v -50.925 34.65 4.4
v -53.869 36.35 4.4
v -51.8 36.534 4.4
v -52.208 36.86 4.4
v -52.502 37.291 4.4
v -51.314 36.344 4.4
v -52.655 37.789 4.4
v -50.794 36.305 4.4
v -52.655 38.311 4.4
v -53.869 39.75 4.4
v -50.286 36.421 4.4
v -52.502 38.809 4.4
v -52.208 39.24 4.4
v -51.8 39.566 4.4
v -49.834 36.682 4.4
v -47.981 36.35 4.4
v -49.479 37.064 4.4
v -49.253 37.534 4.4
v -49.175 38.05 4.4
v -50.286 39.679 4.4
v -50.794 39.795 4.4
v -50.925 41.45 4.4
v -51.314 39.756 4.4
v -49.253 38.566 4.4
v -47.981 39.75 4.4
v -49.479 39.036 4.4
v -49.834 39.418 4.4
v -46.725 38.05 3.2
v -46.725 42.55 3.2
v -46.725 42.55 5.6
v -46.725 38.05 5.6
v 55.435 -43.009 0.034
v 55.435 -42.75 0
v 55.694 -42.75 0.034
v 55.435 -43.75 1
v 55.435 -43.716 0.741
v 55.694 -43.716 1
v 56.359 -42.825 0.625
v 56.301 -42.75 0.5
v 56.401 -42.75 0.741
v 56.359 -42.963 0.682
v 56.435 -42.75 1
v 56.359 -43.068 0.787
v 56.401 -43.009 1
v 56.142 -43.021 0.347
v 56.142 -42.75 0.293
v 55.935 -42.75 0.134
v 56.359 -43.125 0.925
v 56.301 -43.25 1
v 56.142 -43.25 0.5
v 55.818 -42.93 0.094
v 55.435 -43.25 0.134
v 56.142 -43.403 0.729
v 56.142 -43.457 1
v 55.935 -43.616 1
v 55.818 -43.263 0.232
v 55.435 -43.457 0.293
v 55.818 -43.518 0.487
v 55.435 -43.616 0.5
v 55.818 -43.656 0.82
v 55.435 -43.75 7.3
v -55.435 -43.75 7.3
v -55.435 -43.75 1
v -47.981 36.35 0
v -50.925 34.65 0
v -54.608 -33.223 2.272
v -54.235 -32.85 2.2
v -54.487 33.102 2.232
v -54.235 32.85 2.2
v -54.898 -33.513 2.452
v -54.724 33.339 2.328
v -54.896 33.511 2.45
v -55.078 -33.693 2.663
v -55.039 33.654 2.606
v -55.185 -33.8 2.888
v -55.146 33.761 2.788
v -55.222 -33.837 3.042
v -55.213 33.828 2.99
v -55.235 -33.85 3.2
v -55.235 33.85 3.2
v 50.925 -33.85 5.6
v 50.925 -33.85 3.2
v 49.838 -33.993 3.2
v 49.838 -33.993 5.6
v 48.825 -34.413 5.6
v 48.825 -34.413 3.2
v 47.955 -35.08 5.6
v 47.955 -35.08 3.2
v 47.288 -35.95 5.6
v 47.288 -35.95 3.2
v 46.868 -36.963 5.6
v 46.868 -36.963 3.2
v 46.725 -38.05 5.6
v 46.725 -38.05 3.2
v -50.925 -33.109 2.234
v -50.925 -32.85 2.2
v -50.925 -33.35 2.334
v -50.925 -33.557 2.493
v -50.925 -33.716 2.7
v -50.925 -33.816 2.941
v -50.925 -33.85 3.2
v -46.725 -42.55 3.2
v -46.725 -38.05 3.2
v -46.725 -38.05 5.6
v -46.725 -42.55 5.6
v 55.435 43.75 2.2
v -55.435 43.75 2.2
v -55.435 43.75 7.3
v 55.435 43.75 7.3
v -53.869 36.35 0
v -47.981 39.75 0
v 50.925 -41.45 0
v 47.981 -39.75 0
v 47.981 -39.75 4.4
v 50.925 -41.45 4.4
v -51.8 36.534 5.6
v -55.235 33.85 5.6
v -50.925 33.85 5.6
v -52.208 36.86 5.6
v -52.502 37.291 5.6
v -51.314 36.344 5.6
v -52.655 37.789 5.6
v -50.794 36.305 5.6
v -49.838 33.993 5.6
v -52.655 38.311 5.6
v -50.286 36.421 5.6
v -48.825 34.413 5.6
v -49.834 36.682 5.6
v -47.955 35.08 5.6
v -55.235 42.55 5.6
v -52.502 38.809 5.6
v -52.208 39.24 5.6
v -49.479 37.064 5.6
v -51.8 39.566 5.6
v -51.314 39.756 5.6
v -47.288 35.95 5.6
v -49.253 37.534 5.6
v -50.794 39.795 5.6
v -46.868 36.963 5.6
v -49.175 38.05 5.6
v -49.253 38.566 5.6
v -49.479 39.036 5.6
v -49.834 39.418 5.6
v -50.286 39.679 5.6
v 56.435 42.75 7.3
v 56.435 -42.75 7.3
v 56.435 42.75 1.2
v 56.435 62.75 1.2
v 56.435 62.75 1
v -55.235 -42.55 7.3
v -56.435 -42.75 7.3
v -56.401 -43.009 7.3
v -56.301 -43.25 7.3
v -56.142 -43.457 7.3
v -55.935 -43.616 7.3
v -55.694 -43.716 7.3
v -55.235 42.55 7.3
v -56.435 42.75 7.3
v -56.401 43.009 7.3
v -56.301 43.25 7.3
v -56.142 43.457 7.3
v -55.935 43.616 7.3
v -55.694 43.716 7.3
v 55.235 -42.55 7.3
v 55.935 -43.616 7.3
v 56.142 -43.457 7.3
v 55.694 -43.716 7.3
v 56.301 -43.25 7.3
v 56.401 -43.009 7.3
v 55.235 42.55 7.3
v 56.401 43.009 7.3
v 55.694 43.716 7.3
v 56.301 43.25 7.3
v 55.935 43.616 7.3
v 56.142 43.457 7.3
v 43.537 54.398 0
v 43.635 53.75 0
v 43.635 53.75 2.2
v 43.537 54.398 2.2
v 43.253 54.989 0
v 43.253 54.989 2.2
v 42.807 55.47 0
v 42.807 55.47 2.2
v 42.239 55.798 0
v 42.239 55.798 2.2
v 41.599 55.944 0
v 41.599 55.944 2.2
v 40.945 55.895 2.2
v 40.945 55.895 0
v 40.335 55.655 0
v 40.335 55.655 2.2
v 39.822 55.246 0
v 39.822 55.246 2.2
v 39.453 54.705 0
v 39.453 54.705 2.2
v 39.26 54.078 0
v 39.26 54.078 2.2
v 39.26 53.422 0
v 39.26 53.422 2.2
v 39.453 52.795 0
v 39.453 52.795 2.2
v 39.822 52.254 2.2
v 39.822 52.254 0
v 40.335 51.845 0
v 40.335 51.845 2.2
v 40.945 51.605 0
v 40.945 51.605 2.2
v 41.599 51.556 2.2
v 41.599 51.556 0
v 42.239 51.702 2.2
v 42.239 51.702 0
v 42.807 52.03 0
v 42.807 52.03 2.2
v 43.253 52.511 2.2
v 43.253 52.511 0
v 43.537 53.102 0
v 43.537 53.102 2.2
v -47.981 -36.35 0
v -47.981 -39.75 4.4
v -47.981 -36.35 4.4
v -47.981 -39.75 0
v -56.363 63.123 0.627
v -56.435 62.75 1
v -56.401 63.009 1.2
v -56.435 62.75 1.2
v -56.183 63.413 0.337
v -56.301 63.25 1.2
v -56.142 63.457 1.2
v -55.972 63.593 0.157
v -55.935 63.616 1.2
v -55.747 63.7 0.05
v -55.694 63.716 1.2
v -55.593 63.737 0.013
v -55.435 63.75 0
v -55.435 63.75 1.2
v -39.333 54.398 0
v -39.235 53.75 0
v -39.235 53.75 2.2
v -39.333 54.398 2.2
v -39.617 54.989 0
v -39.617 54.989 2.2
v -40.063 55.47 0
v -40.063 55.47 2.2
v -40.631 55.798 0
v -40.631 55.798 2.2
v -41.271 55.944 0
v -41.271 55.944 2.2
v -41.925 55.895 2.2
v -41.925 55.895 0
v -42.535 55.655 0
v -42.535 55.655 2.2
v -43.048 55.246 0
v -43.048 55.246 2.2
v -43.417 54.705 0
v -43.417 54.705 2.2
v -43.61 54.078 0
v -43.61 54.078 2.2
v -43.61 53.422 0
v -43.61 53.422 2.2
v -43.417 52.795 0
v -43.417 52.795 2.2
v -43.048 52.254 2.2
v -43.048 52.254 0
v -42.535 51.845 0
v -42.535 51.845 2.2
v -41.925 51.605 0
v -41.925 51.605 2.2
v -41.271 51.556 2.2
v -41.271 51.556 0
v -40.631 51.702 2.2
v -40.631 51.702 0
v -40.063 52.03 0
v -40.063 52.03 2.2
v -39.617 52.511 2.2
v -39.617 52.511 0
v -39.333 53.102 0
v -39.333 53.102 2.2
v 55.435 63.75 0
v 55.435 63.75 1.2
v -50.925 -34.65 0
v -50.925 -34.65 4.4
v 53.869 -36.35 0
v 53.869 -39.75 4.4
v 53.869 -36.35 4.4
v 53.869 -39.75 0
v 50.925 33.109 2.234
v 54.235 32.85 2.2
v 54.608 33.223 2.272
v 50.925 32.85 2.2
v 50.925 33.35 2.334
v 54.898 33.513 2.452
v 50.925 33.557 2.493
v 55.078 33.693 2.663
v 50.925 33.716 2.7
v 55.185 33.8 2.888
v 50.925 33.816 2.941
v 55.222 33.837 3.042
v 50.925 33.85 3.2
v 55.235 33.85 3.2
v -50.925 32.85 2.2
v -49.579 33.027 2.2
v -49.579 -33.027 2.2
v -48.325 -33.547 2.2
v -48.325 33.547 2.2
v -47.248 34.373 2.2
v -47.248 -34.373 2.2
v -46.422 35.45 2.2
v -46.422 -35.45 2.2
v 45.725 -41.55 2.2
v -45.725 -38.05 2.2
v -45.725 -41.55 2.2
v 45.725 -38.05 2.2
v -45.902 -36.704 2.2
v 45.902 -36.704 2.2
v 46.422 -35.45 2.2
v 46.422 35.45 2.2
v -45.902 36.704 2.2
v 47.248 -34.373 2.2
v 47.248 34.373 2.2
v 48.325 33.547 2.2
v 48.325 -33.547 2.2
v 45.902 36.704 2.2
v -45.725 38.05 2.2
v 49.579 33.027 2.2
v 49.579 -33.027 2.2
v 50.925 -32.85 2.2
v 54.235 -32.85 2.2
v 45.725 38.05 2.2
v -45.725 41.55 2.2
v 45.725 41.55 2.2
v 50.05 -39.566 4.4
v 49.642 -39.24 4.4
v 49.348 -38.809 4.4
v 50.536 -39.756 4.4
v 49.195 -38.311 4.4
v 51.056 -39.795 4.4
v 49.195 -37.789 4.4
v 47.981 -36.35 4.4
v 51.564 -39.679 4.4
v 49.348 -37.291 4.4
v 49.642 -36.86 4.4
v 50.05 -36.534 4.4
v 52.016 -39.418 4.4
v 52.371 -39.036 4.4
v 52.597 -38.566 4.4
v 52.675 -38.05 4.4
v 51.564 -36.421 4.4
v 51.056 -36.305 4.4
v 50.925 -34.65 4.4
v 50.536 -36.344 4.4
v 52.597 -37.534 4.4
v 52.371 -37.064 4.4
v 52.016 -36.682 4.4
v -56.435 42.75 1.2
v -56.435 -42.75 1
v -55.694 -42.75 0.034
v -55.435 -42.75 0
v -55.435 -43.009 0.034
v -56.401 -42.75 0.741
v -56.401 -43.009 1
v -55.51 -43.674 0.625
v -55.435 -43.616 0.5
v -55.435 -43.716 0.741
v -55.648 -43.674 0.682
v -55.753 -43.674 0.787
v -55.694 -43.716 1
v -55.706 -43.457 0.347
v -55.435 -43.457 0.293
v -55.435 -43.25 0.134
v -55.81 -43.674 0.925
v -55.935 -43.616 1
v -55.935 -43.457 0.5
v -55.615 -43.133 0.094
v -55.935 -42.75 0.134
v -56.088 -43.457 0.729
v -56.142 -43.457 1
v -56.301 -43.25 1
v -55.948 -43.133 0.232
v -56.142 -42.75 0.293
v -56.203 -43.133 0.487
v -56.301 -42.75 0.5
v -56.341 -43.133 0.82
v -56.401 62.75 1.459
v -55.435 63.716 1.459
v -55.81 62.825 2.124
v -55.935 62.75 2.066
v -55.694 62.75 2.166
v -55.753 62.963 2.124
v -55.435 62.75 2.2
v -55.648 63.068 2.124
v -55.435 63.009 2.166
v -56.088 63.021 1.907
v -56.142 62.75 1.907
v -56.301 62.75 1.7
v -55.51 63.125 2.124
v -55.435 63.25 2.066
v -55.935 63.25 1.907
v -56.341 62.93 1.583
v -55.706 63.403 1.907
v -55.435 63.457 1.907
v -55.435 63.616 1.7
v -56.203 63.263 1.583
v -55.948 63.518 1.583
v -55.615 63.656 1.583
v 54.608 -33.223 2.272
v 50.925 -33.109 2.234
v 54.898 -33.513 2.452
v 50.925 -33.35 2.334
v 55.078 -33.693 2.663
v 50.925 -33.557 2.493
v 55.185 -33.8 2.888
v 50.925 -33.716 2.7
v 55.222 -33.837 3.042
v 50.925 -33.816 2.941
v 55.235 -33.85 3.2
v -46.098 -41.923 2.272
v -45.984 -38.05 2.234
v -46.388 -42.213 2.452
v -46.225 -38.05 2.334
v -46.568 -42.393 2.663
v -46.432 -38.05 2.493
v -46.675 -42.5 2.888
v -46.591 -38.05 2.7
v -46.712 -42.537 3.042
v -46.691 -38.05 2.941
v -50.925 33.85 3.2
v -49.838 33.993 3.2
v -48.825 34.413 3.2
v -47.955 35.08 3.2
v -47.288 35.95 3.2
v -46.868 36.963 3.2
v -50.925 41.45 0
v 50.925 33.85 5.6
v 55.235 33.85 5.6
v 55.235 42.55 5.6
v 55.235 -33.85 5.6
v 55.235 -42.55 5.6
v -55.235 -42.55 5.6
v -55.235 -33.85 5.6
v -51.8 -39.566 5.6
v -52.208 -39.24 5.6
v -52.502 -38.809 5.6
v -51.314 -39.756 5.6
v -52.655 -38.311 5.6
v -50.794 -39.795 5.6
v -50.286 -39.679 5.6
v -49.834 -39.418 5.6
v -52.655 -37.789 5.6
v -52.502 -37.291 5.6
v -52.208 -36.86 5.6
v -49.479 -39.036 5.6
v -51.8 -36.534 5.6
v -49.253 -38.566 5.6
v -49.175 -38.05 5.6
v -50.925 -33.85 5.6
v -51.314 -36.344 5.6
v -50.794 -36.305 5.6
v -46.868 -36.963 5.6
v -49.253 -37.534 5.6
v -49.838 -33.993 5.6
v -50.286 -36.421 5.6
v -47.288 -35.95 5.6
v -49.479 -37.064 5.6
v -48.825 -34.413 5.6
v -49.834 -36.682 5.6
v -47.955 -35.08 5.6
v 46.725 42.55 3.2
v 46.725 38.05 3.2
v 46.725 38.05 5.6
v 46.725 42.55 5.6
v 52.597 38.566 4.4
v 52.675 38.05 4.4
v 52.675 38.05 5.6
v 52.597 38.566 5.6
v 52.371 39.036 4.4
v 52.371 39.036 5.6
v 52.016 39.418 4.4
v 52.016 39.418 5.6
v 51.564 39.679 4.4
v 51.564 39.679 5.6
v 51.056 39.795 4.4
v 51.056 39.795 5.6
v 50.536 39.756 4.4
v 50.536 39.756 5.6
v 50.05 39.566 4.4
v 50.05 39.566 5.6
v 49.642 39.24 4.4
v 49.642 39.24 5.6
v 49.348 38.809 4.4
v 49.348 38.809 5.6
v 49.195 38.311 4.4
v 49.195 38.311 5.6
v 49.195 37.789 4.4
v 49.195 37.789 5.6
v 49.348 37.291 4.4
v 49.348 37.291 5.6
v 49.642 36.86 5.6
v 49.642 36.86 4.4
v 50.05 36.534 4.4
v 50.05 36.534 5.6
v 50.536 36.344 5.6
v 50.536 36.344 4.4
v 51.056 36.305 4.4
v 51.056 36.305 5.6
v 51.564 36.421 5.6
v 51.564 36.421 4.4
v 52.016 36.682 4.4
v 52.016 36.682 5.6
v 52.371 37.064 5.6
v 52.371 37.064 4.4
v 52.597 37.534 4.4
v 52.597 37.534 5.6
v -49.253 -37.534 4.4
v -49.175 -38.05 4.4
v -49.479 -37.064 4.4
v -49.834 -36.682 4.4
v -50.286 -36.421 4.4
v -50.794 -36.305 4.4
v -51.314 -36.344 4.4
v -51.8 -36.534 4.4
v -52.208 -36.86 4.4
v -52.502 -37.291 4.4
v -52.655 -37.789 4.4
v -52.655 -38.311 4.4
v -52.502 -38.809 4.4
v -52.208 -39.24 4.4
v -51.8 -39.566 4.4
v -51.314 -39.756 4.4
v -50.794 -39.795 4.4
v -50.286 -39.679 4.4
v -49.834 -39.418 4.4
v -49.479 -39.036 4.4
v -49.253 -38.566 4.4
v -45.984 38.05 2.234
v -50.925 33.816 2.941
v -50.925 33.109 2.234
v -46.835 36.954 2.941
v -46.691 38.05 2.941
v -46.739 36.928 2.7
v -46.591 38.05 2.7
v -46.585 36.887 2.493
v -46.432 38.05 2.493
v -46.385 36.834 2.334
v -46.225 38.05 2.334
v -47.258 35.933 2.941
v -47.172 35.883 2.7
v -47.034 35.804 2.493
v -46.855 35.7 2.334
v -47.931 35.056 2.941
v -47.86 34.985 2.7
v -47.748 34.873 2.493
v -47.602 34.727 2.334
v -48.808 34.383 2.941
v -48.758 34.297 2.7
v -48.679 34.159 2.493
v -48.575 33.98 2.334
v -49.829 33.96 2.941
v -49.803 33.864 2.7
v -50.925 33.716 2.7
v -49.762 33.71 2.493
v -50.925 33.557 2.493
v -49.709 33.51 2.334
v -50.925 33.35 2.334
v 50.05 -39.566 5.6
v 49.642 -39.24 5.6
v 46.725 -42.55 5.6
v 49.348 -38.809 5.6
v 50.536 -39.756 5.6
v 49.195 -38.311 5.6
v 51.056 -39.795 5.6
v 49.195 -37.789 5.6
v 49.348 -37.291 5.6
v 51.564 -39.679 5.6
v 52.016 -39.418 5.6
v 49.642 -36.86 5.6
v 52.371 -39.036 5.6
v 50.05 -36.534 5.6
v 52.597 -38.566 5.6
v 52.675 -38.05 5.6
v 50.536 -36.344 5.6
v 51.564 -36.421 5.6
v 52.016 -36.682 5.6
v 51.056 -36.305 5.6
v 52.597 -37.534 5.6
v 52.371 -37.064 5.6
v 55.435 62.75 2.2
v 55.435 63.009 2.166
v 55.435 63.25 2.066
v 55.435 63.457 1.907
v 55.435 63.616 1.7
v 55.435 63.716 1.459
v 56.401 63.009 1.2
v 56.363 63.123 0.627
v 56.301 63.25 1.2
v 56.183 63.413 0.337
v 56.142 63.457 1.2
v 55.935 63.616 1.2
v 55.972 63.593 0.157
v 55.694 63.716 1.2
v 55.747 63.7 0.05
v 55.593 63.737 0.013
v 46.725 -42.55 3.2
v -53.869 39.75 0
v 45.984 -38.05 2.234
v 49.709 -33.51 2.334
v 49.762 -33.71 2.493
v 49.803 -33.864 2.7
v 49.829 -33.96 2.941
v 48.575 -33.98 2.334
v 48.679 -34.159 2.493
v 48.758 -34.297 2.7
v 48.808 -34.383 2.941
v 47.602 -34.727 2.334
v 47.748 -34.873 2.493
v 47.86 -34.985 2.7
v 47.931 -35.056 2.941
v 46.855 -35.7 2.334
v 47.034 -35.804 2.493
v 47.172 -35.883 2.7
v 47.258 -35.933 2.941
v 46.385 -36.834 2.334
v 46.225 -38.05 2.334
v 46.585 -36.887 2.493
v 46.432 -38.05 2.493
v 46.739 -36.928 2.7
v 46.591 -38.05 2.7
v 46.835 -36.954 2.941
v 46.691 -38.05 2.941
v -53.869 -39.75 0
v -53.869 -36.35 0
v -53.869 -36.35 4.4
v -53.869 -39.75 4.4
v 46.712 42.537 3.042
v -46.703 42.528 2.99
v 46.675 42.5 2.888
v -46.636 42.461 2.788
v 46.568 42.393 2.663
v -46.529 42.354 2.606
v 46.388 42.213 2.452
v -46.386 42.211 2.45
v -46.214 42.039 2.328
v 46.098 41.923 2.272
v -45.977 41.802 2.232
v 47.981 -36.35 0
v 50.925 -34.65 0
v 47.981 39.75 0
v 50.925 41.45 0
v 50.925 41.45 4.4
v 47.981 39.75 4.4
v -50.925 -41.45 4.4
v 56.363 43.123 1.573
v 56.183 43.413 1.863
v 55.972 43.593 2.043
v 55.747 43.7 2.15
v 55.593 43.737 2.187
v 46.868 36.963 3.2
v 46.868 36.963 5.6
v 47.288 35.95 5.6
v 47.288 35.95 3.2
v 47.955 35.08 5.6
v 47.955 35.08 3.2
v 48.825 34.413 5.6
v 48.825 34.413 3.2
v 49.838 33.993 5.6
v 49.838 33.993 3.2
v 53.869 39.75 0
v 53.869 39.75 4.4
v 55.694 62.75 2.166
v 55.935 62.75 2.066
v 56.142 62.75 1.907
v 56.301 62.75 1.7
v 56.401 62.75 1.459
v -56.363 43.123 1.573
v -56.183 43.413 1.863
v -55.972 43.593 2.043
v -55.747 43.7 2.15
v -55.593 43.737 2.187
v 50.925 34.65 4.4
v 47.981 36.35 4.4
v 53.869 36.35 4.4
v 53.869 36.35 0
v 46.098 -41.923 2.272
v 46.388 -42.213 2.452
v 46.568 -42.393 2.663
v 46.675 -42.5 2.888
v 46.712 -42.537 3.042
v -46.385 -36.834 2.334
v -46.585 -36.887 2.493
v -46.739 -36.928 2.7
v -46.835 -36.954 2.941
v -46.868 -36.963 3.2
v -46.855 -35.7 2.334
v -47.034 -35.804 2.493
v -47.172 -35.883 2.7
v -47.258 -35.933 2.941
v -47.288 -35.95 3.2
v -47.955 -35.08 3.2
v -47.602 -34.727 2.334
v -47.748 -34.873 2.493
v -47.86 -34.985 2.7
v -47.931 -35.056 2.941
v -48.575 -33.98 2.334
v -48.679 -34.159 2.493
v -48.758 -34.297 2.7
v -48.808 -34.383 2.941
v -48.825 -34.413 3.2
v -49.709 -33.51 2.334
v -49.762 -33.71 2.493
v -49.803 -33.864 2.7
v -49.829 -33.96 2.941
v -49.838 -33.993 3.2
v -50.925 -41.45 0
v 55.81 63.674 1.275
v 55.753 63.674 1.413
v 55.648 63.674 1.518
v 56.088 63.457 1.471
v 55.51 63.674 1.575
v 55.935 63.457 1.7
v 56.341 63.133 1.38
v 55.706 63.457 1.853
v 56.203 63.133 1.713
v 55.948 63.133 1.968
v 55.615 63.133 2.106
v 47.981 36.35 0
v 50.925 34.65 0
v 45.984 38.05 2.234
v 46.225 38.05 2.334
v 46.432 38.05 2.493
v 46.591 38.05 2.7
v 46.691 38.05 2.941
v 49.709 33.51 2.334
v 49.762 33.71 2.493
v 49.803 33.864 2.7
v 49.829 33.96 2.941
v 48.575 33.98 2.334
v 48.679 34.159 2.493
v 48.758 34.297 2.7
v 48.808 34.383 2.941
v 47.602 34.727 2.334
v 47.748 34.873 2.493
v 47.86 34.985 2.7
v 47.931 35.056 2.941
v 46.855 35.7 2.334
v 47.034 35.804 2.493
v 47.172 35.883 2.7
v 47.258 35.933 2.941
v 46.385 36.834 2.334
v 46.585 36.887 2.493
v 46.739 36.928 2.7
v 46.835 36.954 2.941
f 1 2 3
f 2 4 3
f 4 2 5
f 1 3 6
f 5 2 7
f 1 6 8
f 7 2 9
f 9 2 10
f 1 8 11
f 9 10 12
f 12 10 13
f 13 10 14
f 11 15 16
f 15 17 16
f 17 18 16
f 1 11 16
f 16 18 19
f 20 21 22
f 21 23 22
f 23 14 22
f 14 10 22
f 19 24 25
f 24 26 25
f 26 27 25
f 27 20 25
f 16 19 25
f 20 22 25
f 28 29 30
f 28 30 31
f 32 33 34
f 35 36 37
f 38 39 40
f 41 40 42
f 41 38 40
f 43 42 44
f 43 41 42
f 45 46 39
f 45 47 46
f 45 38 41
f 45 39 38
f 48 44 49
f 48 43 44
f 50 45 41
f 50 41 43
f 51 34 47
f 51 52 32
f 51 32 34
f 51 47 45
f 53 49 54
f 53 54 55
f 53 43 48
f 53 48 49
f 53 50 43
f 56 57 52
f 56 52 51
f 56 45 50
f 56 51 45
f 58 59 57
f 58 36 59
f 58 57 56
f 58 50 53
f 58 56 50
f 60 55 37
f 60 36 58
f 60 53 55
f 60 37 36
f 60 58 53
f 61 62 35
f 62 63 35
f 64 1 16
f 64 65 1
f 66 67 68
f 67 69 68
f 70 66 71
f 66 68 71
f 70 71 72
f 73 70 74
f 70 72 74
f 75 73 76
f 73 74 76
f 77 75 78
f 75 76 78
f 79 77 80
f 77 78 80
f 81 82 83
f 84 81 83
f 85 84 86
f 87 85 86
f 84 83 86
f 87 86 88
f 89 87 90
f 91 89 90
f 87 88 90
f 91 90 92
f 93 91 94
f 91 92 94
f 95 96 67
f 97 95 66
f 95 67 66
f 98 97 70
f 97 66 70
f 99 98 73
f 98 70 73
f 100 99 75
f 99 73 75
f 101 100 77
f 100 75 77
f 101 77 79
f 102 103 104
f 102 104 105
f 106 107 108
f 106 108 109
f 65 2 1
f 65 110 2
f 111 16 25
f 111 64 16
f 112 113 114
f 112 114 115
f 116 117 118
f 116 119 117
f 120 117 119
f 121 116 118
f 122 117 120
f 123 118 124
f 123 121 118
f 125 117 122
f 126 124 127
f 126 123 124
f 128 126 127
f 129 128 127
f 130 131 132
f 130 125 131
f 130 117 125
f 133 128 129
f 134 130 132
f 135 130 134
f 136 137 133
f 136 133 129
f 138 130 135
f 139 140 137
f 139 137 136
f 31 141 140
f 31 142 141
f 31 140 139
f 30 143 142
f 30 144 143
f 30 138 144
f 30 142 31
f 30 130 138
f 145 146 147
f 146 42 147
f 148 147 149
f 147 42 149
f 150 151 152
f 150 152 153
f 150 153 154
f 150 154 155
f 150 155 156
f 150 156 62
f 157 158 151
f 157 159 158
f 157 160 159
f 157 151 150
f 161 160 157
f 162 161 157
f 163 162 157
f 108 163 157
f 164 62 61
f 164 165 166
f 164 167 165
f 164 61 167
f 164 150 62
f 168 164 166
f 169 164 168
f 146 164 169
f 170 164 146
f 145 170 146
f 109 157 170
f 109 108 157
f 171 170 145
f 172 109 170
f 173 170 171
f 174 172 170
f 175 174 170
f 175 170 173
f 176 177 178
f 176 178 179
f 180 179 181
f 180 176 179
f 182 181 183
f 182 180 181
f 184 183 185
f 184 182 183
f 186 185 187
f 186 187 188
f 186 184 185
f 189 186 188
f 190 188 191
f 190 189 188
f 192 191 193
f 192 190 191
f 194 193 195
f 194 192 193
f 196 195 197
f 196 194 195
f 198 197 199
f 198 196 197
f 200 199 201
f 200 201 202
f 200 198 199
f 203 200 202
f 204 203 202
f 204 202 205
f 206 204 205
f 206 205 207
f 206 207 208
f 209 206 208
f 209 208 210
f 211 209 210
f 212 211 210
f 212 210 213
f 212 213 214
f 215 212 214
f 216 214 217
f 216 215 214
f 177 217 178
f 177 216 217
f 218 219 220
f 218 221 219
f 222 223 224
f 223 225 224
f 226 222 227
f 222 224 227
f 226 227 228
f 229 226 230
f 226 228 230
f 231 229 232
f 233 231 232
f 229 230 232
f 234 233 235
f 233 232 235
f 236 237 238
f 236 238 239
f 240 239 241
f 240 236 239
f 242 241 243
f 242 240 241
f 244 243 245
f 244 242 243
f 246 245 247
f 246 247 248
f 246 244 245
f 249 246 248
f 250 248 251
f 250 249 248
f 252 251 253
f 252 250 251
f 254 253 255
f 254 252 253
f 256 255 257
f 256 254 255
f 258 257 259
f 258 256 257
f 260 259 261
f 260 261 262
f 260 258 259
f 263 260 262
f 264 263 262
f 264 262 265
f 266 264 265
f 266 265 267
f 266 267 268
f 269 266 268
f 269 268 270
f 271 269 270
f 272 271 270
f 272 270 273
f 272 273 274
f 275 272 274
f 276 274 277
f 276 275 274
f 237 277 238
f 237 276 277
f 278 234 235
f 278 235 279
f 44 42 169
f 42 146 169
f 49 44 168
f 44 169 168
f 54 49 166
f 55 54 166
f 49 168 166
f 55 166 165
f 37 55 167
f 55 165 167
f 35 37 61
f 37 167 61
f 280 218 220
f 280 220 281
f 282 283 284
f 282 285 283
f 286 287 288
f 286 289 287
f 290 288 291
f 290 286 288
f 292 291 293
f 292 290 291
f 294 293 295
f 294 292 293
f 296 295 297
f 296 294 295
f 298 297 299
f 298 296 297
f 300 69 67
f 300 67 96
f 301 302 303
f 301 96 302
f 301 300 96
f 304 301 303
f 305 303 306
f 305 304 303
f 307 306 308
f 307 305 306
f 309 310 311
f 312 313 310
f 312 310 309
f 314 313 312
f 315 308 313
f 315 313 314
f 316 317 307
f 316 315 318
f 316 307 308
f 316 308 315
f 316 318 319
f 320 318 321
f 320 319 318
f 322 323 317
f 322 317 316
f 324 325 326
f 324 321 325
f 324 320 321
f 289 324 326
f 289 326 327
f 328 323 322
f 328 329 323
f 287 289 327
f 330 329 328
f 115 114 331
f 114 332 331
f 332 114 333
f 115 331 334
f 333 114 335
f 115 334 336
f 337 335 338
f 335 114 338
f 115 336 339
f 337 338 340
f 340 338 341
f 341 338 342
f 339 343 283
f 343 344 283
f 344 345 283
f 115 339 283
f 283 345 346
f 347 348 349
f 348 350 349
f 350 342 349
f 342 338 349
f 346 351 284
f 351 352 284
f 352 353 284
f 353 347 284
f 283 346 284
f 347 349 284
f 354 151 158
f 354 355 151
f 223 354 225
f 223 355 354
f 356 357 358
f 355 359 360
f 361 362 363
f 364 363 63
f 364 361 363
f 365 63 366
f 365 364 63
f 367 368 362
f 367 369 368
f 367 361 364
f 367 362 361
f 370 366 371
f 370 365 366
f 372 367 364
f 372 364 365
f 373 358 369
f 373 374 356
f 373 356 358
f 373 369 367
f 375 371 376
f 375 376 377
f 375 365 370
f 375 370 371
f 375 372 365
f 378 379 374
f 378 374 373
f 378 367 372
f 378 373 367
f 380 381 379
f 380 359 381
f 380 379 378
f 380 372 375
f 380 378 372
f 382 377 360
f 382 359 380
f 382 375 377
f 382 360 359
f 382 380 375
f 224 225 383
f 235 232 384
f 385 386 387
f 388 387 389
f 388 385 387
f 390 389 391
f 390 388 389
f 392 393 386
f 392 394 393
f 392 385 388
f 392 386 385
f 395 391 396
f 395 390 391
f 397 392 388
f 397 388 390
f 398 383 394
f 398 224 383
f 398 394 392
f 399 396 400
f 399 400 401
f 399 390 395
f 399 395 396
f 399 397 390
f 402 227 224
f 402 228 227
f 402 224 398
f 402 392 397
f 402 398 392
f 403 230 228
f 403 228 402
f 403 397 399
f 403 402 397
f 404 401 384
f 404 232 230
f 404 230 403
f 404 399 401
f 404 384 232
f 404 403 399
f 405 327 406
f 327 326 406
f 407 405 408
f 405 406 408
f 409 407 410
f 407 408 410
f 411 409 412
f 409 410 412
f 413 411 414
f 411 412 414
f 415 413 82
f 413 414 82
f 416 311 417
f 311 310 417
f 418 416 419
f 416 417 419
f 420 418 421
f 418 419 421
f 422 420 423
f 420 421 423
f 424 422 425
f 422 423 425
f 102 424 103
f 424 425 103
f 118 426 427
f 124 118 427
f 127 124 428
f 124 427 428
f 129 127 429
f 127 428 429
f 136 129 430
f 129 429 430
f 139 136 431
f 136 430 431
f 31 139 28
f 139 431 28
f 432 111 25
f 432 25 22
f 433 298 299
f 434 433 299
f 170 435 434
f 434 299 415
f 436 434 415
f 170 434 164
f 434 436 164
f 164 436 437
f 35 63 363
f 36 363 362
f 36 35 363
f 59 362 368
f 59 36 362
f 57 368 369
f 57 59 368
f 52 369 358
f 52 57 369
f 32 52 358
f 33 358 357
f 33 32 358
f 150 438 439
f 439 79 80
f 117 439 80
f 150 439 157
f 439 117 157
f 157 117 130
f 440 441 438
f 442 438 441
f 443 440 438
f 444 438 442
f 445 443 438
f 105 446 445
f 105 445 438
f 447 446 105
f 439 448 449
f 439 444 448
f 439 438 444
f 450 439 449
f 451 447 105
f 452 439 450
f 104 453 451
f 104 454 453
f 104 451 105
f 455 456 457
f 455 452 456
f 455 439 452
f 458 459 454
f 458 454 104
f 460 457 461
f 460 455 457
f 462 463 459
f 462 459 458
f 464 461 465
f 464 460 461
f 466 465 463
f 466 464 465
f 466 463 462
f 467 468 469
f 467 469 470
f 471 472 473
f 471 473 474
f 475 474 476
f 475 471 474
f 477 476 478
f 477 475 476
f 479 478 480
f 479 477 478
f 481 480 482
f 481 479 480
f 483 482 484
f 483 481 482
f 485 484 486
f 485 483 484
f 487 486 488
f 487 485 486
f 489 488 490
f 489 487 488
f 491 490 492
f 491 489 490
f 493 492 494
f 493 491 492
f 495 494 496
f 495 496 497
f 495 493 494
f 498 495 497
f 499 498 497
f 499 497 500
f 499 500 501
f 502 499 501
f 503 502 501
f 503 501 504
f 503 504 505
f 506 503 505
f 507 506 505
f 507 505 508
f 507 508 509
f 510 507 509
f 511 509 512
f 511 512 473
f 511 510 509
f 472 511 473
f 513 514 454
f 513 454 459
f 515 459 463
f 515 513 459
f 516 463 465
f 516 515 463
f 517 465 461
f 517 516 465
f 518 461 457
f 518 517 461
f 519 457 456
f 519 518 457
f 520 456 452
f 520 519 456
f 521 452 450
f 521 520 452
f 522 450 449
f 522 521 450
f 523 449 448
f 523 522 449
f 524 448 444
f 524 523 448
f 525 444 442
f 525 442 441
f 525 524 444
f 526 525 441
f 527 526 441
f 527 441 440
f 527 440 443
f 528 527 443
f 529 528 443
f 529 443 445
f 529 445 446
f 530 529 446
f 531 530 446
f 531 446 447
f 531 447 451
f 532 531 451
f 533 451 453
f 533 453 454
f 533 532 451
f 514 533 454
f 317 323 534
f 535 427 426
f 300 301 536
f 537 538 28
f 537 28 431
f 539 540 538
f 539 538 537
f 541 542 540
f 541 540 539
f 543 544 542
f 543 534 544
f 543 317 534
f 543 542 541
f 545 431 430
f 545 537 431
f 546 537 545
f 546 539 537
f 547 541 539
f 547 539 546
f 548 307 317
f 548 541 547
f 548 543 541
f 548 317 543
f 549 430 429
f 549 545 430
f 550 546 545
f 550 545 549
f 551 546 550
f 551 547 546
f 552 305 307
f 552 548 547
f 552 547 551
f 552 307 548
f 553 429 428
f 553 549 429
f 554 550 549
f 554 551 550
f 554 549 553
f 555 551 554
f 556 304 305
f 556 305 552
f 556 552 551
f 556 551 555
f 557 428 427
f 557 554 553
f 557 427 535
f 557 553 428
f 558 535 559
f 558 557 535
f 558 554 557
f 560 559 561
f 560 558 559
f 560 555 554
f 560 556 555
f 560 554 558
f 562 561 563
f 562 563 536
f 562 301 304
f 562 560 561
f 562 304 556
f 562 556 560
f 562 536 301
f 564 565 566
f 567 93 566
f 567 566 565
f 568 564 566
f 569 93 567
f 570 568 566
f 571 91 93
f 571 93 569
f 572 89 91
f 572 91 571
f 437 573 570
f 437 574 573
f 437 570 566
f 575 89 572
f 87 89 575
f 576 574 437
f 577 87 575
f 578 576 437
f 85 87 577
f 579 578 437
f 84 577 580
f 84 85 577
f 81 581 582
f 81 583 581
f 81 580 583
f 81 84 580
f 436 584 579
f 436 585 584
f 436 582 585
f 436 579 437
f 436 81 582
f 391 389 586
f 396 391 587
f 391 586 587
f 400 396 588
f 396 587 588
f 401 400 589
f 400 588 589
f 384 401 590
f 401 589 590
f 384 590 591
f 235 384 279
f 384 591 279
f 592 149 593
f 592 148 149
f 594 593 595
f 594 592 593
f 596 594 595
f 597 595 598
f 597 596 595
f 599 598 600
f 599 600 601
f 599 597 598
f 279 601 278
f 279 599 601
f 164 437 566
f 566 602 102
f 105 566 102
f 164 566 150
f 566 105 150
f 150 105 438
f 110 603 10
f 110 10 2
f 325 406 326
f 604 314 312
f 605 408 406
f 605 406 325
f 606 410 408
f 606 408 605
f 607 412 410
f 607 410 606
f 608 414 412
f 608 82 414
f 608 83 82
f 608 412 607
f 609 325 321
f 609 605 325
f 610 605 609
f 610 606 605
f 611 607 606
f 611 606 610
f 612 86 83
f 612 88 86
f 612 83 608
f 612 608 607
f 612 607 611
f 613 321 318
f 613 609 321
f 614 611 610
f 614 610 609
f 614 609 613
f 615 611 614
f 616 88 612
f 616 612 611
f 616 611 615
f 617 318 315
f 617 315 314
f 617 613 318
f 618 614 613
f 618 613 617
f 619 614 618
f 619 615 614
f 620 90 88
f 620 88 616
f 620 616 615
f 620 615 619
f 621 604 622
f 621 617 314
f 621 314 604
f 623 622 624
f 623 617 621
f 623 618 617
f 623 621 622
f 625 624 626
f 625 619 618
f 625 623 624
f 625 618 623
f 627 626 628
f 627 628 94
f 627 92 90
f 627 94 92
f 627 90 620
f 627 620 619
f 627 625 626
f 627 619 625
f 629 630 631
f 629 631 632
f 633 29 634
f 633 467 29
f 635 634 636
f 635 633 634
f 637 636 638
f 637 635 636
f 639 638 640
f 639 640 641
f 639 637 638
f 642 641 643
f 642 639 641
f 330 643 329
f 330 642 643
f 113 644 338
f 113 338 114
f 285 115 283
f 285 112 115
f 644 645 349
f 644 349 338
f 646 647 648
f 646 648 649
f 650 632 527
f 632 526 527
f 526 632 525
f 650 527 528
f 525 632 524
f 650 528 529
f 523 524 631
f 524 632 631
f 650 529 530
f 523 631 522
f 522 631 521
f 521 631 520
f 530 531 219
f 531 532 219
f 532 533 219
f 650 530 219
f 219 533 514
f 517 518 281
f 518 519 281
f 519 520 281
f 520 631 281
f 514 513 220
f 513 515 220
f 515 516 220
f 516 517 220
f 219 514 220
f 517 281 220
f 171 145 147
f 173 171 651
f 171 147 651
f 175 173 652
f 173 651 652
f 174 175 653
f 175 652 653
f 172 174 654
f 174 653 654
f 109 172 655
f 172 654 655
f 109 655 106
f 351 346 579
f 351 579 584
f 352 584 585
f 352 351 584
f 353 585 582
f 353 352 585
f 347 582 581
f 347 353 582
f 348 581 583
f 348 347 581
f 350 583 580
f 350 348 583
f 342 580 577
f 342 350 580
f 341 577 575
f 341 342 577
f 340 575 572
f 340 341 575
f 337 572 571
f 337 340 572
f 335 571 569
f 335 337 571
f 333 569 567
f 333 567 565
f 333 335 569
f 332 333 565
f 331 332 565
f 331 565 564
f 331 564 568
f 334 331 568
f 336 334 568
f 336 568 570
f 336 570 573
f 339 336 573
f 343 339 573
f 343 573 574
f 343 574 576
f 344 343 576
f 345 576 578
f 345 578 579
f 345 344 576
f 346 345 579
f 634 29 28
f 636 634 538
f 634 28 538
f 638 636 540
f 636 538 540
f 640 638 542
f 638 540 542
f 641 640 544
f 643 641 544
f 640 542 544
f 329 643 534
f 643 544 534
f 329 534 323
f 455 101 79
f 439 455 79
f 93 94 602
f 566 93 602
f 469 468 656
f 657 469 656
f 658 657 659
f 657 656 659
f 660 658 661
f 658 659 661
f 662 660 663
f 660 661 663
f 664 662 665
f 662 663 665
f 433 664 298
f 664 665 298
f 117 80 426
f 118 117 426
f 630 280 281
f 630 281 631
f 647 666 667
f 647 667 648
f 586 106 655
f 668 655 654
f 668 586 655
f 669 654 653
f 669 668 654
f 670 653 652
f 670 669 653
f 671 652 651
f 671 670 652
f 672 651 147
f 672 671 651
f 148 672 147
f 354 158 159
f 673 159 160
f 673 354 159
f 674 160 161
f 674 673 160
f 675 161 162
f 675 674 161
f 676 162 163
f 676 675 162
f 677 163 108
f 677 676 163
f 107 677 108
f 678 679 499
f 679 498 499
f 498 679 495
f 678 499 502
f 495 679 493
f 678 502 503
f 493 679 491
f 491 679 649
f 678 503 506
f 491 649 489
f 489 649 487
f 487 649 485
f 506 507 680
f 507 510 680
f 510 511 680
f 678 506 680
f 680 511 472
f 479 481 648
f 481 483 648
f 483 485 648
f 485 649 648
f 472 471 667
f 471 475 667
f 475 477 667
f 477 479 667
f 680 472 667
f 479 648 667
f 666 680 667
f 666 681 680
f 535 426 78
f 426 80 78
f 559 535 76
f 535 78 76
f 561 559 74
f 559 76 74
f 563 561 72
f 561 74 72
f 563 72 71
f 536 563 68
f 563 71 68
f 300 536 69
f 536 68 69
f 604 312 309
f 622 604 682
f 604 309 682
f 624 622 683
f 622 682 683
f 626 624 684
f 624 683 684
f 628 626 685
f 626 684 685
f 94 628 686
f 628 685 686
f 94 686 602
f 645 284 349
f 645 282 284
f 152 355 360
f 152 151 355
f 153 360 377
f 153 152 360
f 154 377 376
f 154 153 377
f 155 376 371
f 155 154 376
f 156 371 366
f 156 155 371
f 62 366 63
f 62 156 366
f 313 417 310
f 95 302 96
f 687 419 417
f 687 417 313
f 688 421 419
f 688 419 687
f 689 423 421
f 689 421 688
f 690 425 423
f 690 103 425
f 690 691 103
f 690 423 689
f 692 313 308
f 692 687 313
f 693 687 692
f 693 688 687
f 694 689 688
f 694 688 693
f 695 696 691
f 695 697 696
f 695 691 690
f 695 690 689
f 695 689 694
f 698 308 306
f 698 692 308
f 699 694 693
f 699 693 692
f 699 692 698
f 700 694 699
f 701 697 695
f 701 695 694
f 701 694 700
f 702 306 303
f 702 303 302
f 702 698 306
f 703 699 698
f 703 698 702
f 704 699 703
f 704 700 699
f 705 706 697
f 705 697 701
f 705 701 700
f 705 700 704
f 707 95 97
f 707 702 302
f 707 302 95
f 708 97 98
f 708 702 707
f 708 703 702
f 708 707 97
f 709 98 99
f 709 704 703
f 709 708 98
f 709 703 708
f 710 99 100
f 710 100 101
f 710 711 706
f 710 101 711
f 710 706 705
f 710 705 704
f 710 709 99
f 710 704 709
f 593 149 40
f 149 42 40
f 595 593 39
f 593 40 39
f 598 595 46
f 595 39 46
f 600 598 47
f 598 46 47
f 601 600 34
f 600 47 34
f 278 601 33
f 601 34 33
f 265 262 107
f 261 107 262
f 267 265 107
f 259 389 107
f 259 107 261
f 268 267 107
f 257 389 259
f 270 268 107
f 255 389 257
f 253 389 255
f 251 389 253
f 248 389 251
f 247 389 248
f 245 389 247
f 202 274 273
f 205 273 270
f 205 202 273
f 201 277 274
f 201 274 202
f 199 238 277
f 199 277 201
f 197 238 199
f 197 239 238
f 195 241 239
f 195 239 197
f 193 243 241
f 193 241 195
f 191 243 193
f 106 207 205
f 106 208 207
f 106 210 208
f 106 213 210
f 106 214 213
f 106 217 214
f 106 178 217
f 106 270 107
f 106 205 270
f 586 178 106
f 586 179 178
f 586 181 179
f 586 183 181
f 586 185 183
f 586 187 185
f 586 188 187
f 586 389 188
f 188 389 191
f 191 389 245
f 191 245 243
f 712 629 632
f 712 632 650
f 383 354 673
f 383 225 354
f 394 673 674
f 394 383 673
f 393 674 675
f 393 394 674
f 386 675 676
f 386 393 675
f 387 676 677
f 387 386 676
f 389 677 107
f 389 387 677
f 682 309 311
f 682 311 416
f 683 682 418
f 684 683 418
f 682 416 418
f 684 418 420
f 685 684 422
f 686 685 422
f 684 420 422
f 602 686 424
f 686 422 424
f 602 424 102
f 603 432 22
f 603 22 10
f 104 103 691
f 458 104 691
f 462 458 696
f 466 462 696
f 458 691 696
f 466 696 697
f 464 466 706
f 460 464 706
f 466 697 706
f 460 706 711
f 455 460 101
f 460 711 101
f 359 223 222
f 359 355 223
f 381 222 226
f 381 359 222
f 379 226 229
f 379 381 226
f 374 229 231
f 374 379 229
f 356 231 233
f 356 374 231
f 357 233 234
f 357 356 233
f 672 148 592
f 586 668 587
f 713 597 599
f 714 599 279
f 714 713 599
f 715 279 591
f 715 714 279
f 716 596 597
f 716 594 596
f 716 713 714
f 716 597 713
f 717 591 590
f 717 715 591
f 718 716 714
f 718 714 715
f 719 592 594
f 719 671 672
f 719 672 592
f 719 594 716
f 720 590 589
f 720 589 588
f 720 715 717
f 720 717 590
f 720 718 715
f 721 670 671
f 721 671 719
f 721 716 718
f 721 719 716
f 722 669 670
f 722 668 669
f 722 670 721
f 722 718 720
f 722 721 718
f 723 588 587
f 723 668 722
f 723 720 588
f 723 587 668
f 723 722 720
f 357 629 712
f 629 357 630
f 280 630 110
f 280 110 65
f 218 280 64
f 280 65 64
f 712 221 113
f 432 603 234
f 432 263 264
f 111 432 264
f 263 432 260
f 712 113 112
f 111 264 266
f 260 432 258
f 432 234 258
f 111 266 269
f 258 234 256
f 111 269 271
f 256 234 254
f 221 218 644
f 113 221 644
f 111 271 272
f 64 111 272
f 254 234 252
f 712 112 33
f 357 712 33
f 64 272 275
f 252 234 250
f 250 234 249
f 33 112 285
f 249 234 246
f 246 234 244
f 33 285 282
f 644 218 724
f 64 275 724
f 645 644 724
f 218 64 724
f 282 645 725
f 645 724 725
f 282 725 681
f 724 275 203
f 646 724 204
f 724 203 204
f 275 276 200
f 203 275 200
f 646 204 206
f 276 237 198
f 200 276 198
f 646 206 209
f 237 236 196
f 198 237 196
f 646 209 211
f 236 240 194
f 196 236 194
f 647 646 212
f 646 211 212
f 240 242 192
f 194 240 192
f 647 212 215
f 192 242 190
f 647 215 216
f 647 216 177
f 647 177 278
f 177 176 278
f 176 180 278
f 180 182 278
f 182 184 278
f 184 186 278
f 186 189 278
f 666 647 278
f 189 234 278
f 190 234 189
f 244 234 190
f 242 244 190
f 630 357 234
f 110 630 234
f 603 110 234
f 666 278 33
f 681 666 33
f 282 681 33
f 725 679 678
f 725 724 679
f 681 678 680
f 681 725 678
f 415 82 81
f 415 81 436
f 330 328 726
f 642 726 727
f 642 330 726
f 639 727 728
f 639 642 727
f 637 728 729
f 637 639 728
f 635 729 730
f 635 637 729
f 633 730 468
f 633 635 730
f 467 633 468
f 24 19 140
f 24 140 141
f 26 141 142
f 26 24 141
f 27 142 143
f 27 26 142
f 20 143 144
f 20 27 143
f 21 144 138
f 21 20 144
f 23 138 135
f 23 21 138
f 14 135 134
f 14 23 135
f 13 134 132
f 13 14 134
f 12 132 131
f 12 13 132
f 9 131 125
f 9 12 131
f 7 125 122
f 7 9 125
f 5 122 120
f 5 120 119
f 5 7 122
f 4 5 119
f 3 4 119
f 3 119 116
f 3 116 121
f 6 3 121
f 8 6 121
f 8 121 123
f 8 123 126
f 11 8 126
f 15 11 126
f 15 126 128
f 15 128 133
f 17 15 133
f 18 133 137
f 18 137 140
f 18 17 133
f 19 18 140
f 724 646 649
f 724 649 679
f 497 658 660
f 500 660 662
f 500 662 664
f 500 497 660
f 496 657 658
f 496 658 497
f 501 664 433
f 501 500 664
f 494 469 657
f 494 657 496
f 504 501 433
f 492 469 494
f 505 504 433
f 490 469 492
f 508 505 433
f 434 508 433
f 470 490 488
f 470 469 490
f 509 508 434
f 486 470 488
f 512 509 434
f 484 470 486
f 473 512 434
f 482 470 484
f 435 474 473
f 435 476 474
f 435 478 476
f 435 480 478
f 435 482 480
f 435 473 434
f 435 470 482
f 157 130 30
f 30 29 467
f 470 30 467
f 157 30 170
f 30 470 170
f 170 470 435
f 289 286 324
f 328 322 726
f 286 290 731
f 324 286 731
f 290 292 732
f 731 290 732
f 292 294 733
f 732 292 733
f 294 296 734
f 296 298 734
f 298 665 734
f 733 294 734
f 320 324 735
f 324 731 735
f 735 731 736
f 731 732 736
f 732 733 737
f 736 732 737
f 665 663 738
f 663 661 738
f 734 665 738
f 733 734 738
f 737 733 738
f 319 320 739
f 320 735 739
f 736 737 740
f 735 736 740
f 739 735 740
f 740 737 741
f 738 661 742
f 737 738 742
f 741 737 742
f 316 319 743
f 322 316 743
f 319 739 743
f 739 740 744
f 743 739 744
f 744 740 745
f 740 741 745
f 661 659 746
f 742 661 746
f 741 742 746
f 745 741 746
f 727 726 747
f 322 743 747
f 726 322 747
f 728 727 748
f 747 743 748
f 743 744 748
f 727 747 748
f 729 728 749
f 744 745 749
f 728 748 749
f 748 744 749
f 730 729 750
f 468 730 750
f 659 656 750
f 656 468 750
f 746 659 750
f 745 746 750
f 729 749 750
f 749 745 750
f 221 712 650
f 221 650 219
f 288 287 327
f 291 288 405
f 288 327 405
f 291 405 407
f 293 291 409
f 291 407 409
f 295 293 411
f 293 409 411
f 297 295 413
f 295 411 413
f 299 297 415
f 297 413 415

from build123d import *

# Parameters (mm, degrees)
SKETCH005_W  = 112.87
SKETCH005_H  = 87.5
PAD_DEPTH    = 2.2
SKETCH006_W  = 112.87
SKETCH006_H  = 87.5
PAD001_DEPTH = 2.2
SKETCH007_W  = 112.87
SKETCH007_H  = 87.5
SKETCH007_R  = 1.75
PAD002_DEPTH = 1.2
SKETCH008_W  = 112.87
SKETCH008_H  = 87.5
PAD003_DEPTH = 1.7
SKETCH010_W  = 112.87
SKETCH010_H  = 20
SKETCH010_R  = 2.2
PAD004_DEPTH = 2.2
FILLET_R     = 1


with BuildPart() as part:
    # Sketch005 → Pad (new body)
    with BuildSketch(Plane.XY):
        Rectangle(SKETCH005_W, SKETCH005_H)
        Polygon((-47.980514, 36.35), (-47.980514, 39.75), (-50.925, 41.45), (-53.869486, 39.75), (-53.869486, 36.35), (-50.925, 34.65), align=None, mode=Mode.SUBTRACT)
        Polygon((53.869486, 36.35), (53.869486, 39.75), (50.925, 41.45), (47.980514, 39.75), (47.980514, 36.35), (50.925, 34.65), align=None, mode=Mode.SUBTRACT)
        Polygon((53.869486, -36.35), (50.925, -34.65), (47.980514, -36.35), (47.980514, -39.75), (50.925, -41.45), (53.869486, -39.75), align=None, mode=Mode.SUBTRACT)
        Polygon((-47.980514, -39.75), (-47.980514, -36.35), (-50.925, -34.65), (-53.869486, -36.35), (-53.869486, -39.75), (-50.925, -41.45), align=None, mode=Mode.SUBTRACT)
    extrude(amount=PAD_DEPTH)

    # Sketch006 → Pad001 (join)
    with BuildSketch(Plane.XY.offset(2.2)):
        Rectangle(SKETCH006_W, SKETCH006_H)
        with BuildLine():
            Line((55.235, 33.85), (55.235, -33.85))
            Line((50.925, -33.85), (55.235, -33.85))
            ThreePointArc((50.925, -33.85), (47.955152, -35.080152), (46.725, -38.05))
            Line((46.725, -38.05), (46.725, -42.55))
            Line((46.725, -42.55), (-46.725, -42.55))
            Line((-46.725, -38.05), (-46.725, -42.55))
            ThreePointArc((-46.725, -38.05), (-47.955152, -35.080152), (-50.925, -33.85))
            Line((-50.925, -33.85), (-55.235, -33.85))
            Line((-55.235, -33.85), (-55.235, 33.85))
            Line((-55.235, 33.85), (-50.925, 33.85))
            ThreePointArc((-50.925, 33.85), (-47.955152, 35.080152), (-46.725, 38.05))
            Line((-46.725, 42.55), (-46.725, 38.05))
            Line((-46.725, 42.55), (46.725, 42.55))
            Line((46.725, 38.05), (46.725, 42.55))
            ThreePointArc((46.725, 38.05), (47.955152, 35.080152), (50.925, 33.85))
            Line((50.925, 33.85), (55.235, 33.85))
        make_face(mode=Mode.SUBTRACT)
        Polygon((-47.980514, 36.35), (-47.980514, 39.75), (-50.925, 41.45), (-53.869486, 39.75), (-53.869486, 36.35), (-50.925, 34.65), align=None, mode=Mode.SUBTRACT)
        Polygon((53.869486, 36.35), (53.869486, 39.75), (50.925, 41.45), (47.980514, 39.75), (47.980514, 36.35), (50.925, 34.65), align=None, mode=Mode.SUBTRACT)
        Polygon((53.869486, -36.35), (50.925, -34.65), (47.980514, -36.35), (47.980514, -39.75), (50.925, -41.45), (53.869486, -39.75), align=None, mode=Mode.SUBTRACT)
        Polygon((-47.980514, -39.75), (-47.980514, -36.35), (-50.925, -34.65), (-53.869486, -36.35), (-53.869486, -39.75), (-50.925, -41.45), align=None, mode=Mode.SUBTRACT)
    extrude(amount=PAD001_DEPTH)

    # Sketch007 → Pad002 (join)
    with BuildSketch(Plane.XY.offset(4.4)):
        Rectangle(SKETCH007_W, SKETCH007_H)
        with Locations((-50.925, 38.05)):
            Circle(SKETCH007_R, mode=Mode.SUBTRACT)
        with Locations((50.925, 38.05)):
            Circle(SKETCH007_R, mode=Mode.SUBTRACT)
        with Locations((50.925, -38.05)):
            Circle(SKETCH007_R, mode=Mode.SUBTRACT)
        with Locations((-50.925, -38.05)):
            Circle(SKETCH007_R, mode=Mode.SUBTRACT)
        with BuildLine():
            Line((55.235, 33.85), (55.235, -33.85))
            Line((50.925, -33.85), (55.235, -33.85))
            ThreePointArc((50.925, -33.85), (47.955152, -35.080152), (46.725, -38.05))
            Line((46.725, -38.05), (46.725, -42.55))
            Line((46.725, -42.55), (-46.725, -42.55))
            Line((-46.725, -38.05), (-46.725, -42.55))
            ThreePointArc((-46.725, -38.05), (-47.955152, -35.080152), (-50.925, -33.85))
            Line((-50.925, -33.85), (-55.235, -33.85))
            Line((-55.235, -33.85), (-55.235, 33.85))
            Line((-55.235, 33.85), (-50.925, 33.85))
            ThreePointArc((-50.925, 33.85), (-47.955152, 35.080152), (-46.725, 38.05))
            Line((-46.725, 42.55), (-46.725, 38.05))
            Line((-46.725, 42.55), (46.725, 42.55))
            Line((46.725, 38.05), (46.725, 42.55))
            ThreePointArc((46.725, 38.05), (47.955152, 35.080152), (50.925, 33.85))
            Line((50.925, 33.85), (55.235, 33.85))
        make_face(mode=Mode.SUBTRACT)
    extrude(amount=PAD002_DEPTH)

    # Sketch008 → Pad003 (join)
    with BuildSketch(Plane.XY.offset(5.6)):
        Rectangle(SKETCH008_W, SKETCH008_H)
        Polygon((55.235, 33.85), (55.235, -33.85), (55.235, -42.55), (46.725, -42.55), (-46.725, -42.55), (-55.235, -42.55), (-55.235, -33.85), (-55.235, 33.85), (-55.235, 42.55), (-46.725, 42.55), (46.725, 42.55), (55.235, 42.55), align=None, mode=Mode.SUBTRACT)
    extrude(amount=PAD003_DEPTH)

    # Sketch010 → Pad004 (join)
    with BuildSketch(Plane.XY):
        with Locations((0, 53.75)):
            Rectangle(SKETCH010_W, SKETCH010_H)
        with Locations((-41.435, 53.75)):
            Circle(SKETCH010_R, mode=Mode.SUBTRACT)
        with Locations((41.435, 53.75)):
            Circle(SKETCH010_R, mode=Mode.SUBTRACT)
    extrude(amount=PAD004_DEPTH)

    # Fillet
    fillet_edges = [part.edges().sort_by_distance(p)[0] for p in [
        (-56.435, 10, 0),
        (46.725, 40.3, 2.2),
        (0, 42.55, 2.2),
        (-46.725, 40.3, 2.2),
        (-47.955152, 35.080152, 2.2),
        (-53.08, 33.85, 2.2),
        (-55.235, 0, 2.2),
        (-53.08, -33.85, 2.2),
        (-47.955152, -35.080152, 2.2),
        (-46.725, -40.3, 2.2),
        (0, -42.55, 2.2),
        (46.725, -40.3, 2.2),
        (47.955152, -35.080152, 2.2),
        (53.08, -33.85, 2.2),
        (55.235, 0, 2.2),
        (53.08, 33.85, 2.2),
        (47.955152, 35.080152, 2.2),
        (0, -43.75, 0),
        (56.435, 10, 0),
        (56.435, -43.75, 3.65),
        (56.435, 43.75, 4.75),
        (56.435, 53.75, 2.2),
        (56.435, 63.75, 1.1),
        (-56.435, 63.75, 1.1),
        (-56.435, 53.75, 2.2),
        (0, 63.75, 2.2),
        (-56.435, 43.75, 4.75),
        (-56.435, -43.75, 3.65),
    ]]
    fillet(fillet_edges, radius=FILLET_R)


solid = part.part
